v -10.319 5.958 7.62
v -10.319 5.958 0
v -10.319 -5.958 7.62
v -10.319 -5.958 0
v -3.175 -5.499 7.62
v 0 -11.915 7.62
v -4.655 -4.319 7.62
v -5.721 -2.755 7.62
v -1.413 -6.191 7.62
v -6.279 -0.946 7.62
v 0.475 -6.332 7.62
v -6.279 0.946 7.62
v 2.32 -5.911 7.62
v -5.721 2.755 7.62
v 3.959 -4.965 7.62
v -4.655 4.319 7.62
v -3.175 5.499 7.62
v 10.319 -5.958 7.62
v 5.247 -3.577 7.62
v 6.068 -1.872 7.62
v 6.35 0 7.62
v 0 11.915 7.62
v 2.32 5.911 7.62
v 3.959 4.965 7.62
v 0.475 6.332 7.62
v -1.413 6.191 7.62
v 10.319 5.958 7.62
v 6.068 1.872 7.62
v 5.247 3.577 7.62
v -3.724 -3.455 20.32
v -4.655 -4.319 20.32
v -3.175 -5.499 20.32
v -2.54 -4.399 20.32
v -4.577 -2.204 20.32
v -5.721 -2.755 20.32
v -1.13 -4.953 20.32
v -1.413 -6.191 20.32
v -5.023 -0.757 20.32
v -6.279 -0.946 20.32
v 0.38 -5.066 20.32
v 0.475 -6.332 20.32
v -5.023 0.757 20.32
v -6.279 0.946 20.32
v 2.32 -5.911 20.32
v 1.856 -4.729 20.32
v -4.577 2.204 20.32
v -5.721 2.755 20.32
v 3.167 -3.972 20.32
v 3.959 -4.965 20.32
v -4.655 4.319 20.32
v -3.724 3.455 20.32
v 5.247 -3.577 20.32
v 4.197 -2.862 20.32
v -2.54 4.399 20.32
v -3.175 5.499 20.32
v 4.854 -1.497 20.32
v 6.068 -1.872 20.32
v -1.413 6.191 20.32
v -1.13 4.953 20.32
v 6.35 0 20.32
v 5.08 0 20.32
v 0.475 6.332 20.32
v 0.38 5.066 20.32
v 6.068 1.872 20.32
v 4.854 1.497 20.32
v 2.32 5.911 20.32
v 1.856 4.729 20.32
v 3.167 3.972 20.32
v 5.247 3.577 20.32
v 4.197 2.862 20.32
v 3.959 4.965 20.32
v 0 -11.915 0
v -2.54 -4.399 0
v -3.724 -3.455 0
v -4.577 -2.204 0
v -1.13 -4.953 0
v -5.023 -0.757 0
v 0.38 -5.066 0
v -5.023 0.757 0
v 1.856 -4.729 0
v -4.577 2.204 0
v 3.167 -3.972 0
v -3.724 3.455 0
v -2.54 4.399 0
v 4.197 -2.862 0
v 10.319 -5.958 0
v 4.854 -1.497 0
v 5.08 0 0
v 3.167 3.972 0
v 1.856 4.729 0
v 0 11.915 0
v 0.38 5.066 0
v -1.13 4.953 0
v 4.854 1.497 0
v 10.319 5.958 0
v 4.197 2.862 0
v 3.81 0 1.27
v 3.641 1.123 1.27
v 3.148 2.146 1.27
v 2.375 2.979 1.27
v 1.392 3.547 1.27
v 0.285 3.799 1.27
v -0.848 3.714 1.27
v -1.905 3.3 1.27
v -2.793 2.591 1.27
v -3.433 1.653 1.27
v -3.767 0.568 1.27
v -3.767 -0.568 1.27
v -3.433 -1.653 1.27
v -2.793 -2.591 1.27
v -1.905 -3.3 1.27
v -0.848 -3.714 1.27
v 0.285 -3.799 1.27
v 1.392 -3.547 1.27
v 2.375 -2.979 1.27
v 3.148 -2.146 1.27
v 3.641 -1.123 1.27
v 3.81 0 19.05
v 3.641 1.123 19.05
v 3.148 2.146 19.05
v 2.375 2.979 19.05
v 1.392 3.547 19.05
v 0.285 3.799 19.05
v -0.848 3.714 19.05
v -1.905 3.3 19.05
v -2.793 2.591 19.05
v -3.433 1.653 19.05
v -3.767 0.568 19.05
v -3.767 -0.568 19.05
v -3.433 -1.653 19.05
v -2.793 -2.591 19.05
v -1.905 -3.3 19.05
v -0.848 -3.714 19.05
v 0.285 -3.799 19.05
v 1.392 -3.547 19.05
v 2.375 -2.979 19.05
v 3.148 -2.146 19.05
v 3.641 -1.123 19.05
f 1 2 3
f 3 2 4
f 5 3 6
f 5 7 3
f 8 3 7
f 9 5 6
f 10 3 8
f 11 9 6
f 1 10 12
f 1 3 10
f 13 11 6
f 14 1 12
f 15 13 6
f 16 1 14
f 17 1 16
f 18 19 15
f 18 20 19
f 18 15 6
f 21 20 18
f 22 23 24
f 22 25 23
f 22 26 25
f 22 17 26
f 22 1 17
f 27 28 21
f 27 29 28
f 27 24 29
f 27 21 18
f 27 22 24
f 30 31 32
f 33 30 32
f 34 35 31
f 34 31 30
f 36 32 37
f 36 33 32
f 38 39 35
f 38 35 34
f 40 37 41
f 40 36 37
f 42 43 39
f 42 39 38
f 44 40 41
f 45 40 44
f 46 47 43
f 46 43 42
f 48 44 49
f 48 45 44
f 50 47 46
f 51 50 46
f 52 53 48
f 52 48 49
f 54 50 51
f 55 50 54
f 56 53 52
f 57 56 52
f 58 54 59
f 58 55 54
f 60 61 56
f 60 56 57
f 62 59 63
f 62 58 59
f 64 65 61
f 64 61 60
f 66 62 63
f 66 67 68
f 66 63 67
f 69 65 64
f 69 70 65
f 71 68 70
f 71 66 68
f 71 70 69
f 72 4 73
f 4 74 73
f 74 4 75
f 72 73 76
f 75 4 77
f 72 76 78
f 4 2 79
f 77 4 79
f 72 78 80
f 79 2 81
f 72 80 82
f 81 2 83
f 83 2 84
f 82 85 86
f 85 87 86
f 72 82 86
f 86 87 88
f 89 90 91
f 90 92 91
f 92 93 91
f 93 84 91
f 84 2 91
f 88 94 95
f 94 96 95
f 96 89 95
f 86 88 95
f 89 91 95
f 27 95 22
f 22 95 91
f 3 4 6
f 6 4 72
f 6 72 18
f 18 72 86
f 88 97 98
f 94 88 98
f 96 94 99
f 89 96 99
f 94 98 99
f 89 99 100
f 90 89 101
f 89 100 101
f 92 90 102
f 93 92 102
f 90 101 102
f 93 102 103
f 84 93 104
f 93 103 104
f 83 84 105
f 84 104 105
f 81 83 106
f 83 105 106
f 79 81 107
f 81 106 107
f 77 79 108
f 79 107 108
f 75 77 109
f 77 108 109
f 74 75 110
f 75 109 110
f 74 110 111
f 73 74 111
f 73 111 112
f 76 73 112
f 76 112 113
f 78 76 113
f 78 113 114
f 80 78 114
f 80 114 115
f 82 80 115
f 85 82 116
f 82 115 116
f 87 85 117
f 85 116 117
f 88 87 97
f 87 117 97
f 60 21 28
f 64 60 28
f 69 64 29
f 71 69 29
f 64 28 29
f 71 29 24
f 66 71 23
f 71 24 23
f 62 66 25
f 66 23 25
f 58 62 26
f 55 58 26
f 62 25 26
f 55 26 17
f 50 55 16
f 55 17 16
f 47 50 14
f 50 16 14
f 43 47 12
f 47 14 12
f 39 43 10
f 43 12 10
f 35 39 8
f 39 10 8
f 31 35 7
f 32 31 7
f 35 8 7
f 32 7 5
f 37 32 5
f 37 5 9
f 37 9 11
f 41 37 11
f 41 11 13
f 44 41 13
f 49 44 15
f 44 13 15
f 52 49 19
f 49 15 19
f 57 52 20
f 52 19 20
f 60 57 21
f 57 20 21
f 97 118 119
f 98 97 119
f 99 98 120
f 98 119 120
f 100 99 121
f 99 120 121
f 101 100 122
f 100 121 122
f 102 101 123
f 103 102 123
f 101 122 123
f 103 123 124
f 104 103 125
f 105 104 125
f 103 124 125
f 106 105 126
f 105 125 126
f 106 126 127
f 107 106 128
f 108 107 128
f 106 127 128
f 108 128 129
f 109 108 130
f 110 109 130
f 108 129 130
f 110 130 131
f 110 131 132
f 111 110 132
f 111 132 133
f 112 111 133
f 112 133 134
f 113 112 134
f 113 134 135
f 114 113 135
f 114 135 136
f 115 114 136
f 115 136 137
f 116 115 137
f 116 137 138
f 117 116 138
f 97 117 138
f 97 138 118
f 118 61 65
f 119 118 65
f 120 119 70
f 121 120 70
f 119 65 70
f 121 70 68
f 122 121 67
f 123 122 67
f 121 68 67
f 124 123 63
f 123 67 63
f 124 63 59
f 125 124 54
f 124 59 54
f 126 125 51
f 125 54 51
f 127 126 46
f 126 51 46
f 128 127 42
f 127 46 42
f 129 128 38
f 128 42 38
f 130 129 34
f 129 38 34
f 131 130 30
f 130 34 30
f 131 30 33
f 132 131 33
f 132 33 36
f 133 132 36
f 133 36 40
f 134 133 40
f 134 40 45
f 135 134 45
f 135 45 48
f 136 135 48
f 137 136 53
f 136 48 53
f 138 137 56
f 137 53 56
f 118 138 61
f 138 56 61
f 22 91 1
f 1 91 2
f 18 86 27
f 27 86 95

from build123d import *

# Parameters (mm, degrees)
BOSS_EXTRUDE1_DEPTH = 7.62
SKETCH2_R           = 6.35
BOSS_EXTRUDE2_DEPTH = 12.7
SKETCH3_R           = 3.81
CUT_EXTRUDE1_DEPTH  = 21.32
CHAMFER1_SIZE       = 1.27


with BuildPart() as part:
    # Sketch1 → Boss-Extrude1 (new body)
    with BuildSketch(Plane.XY):
        Polygon((10.31875, 5.95753309), (0, 11.91506618), (-10.31875, 5.95753309), (-10.31875, -5.95753309), (0, -11.91506618), (10.31875, -5.95753309), align=None)
    extrude(amount=BOSS_EXTRUDE1_DEPTH)

    # Sketch2 → Boss-Extrude2 (add)
    with BuildSketch(Plane.XY.offset(7.62)):
        Circle(SKETCH2_R)
    extrude(amount=BOSS_EXTRUDE2_DEPTH)

    # Sketch3 → Cut-Extrude1 (cut, through all)
    with BuildSketch(Plane.XY.offset(20.32)):
        Circle(SKETCH3_R)
    extrude(amount=-CUT_EXTRUDE1_DEPTH, mode=Mode.SUBTRACT)

    # Chamfer1
    chamfer1_edges = [part.edges().sort_by_distance(p)[0] for p in [
        (-3.81, 0, 0),
        (-3.81, 0, 20.32),
    ]]
    chamfer(chamfer1_edges, length=CHAMFER1_SIZE)


solid = part.part
